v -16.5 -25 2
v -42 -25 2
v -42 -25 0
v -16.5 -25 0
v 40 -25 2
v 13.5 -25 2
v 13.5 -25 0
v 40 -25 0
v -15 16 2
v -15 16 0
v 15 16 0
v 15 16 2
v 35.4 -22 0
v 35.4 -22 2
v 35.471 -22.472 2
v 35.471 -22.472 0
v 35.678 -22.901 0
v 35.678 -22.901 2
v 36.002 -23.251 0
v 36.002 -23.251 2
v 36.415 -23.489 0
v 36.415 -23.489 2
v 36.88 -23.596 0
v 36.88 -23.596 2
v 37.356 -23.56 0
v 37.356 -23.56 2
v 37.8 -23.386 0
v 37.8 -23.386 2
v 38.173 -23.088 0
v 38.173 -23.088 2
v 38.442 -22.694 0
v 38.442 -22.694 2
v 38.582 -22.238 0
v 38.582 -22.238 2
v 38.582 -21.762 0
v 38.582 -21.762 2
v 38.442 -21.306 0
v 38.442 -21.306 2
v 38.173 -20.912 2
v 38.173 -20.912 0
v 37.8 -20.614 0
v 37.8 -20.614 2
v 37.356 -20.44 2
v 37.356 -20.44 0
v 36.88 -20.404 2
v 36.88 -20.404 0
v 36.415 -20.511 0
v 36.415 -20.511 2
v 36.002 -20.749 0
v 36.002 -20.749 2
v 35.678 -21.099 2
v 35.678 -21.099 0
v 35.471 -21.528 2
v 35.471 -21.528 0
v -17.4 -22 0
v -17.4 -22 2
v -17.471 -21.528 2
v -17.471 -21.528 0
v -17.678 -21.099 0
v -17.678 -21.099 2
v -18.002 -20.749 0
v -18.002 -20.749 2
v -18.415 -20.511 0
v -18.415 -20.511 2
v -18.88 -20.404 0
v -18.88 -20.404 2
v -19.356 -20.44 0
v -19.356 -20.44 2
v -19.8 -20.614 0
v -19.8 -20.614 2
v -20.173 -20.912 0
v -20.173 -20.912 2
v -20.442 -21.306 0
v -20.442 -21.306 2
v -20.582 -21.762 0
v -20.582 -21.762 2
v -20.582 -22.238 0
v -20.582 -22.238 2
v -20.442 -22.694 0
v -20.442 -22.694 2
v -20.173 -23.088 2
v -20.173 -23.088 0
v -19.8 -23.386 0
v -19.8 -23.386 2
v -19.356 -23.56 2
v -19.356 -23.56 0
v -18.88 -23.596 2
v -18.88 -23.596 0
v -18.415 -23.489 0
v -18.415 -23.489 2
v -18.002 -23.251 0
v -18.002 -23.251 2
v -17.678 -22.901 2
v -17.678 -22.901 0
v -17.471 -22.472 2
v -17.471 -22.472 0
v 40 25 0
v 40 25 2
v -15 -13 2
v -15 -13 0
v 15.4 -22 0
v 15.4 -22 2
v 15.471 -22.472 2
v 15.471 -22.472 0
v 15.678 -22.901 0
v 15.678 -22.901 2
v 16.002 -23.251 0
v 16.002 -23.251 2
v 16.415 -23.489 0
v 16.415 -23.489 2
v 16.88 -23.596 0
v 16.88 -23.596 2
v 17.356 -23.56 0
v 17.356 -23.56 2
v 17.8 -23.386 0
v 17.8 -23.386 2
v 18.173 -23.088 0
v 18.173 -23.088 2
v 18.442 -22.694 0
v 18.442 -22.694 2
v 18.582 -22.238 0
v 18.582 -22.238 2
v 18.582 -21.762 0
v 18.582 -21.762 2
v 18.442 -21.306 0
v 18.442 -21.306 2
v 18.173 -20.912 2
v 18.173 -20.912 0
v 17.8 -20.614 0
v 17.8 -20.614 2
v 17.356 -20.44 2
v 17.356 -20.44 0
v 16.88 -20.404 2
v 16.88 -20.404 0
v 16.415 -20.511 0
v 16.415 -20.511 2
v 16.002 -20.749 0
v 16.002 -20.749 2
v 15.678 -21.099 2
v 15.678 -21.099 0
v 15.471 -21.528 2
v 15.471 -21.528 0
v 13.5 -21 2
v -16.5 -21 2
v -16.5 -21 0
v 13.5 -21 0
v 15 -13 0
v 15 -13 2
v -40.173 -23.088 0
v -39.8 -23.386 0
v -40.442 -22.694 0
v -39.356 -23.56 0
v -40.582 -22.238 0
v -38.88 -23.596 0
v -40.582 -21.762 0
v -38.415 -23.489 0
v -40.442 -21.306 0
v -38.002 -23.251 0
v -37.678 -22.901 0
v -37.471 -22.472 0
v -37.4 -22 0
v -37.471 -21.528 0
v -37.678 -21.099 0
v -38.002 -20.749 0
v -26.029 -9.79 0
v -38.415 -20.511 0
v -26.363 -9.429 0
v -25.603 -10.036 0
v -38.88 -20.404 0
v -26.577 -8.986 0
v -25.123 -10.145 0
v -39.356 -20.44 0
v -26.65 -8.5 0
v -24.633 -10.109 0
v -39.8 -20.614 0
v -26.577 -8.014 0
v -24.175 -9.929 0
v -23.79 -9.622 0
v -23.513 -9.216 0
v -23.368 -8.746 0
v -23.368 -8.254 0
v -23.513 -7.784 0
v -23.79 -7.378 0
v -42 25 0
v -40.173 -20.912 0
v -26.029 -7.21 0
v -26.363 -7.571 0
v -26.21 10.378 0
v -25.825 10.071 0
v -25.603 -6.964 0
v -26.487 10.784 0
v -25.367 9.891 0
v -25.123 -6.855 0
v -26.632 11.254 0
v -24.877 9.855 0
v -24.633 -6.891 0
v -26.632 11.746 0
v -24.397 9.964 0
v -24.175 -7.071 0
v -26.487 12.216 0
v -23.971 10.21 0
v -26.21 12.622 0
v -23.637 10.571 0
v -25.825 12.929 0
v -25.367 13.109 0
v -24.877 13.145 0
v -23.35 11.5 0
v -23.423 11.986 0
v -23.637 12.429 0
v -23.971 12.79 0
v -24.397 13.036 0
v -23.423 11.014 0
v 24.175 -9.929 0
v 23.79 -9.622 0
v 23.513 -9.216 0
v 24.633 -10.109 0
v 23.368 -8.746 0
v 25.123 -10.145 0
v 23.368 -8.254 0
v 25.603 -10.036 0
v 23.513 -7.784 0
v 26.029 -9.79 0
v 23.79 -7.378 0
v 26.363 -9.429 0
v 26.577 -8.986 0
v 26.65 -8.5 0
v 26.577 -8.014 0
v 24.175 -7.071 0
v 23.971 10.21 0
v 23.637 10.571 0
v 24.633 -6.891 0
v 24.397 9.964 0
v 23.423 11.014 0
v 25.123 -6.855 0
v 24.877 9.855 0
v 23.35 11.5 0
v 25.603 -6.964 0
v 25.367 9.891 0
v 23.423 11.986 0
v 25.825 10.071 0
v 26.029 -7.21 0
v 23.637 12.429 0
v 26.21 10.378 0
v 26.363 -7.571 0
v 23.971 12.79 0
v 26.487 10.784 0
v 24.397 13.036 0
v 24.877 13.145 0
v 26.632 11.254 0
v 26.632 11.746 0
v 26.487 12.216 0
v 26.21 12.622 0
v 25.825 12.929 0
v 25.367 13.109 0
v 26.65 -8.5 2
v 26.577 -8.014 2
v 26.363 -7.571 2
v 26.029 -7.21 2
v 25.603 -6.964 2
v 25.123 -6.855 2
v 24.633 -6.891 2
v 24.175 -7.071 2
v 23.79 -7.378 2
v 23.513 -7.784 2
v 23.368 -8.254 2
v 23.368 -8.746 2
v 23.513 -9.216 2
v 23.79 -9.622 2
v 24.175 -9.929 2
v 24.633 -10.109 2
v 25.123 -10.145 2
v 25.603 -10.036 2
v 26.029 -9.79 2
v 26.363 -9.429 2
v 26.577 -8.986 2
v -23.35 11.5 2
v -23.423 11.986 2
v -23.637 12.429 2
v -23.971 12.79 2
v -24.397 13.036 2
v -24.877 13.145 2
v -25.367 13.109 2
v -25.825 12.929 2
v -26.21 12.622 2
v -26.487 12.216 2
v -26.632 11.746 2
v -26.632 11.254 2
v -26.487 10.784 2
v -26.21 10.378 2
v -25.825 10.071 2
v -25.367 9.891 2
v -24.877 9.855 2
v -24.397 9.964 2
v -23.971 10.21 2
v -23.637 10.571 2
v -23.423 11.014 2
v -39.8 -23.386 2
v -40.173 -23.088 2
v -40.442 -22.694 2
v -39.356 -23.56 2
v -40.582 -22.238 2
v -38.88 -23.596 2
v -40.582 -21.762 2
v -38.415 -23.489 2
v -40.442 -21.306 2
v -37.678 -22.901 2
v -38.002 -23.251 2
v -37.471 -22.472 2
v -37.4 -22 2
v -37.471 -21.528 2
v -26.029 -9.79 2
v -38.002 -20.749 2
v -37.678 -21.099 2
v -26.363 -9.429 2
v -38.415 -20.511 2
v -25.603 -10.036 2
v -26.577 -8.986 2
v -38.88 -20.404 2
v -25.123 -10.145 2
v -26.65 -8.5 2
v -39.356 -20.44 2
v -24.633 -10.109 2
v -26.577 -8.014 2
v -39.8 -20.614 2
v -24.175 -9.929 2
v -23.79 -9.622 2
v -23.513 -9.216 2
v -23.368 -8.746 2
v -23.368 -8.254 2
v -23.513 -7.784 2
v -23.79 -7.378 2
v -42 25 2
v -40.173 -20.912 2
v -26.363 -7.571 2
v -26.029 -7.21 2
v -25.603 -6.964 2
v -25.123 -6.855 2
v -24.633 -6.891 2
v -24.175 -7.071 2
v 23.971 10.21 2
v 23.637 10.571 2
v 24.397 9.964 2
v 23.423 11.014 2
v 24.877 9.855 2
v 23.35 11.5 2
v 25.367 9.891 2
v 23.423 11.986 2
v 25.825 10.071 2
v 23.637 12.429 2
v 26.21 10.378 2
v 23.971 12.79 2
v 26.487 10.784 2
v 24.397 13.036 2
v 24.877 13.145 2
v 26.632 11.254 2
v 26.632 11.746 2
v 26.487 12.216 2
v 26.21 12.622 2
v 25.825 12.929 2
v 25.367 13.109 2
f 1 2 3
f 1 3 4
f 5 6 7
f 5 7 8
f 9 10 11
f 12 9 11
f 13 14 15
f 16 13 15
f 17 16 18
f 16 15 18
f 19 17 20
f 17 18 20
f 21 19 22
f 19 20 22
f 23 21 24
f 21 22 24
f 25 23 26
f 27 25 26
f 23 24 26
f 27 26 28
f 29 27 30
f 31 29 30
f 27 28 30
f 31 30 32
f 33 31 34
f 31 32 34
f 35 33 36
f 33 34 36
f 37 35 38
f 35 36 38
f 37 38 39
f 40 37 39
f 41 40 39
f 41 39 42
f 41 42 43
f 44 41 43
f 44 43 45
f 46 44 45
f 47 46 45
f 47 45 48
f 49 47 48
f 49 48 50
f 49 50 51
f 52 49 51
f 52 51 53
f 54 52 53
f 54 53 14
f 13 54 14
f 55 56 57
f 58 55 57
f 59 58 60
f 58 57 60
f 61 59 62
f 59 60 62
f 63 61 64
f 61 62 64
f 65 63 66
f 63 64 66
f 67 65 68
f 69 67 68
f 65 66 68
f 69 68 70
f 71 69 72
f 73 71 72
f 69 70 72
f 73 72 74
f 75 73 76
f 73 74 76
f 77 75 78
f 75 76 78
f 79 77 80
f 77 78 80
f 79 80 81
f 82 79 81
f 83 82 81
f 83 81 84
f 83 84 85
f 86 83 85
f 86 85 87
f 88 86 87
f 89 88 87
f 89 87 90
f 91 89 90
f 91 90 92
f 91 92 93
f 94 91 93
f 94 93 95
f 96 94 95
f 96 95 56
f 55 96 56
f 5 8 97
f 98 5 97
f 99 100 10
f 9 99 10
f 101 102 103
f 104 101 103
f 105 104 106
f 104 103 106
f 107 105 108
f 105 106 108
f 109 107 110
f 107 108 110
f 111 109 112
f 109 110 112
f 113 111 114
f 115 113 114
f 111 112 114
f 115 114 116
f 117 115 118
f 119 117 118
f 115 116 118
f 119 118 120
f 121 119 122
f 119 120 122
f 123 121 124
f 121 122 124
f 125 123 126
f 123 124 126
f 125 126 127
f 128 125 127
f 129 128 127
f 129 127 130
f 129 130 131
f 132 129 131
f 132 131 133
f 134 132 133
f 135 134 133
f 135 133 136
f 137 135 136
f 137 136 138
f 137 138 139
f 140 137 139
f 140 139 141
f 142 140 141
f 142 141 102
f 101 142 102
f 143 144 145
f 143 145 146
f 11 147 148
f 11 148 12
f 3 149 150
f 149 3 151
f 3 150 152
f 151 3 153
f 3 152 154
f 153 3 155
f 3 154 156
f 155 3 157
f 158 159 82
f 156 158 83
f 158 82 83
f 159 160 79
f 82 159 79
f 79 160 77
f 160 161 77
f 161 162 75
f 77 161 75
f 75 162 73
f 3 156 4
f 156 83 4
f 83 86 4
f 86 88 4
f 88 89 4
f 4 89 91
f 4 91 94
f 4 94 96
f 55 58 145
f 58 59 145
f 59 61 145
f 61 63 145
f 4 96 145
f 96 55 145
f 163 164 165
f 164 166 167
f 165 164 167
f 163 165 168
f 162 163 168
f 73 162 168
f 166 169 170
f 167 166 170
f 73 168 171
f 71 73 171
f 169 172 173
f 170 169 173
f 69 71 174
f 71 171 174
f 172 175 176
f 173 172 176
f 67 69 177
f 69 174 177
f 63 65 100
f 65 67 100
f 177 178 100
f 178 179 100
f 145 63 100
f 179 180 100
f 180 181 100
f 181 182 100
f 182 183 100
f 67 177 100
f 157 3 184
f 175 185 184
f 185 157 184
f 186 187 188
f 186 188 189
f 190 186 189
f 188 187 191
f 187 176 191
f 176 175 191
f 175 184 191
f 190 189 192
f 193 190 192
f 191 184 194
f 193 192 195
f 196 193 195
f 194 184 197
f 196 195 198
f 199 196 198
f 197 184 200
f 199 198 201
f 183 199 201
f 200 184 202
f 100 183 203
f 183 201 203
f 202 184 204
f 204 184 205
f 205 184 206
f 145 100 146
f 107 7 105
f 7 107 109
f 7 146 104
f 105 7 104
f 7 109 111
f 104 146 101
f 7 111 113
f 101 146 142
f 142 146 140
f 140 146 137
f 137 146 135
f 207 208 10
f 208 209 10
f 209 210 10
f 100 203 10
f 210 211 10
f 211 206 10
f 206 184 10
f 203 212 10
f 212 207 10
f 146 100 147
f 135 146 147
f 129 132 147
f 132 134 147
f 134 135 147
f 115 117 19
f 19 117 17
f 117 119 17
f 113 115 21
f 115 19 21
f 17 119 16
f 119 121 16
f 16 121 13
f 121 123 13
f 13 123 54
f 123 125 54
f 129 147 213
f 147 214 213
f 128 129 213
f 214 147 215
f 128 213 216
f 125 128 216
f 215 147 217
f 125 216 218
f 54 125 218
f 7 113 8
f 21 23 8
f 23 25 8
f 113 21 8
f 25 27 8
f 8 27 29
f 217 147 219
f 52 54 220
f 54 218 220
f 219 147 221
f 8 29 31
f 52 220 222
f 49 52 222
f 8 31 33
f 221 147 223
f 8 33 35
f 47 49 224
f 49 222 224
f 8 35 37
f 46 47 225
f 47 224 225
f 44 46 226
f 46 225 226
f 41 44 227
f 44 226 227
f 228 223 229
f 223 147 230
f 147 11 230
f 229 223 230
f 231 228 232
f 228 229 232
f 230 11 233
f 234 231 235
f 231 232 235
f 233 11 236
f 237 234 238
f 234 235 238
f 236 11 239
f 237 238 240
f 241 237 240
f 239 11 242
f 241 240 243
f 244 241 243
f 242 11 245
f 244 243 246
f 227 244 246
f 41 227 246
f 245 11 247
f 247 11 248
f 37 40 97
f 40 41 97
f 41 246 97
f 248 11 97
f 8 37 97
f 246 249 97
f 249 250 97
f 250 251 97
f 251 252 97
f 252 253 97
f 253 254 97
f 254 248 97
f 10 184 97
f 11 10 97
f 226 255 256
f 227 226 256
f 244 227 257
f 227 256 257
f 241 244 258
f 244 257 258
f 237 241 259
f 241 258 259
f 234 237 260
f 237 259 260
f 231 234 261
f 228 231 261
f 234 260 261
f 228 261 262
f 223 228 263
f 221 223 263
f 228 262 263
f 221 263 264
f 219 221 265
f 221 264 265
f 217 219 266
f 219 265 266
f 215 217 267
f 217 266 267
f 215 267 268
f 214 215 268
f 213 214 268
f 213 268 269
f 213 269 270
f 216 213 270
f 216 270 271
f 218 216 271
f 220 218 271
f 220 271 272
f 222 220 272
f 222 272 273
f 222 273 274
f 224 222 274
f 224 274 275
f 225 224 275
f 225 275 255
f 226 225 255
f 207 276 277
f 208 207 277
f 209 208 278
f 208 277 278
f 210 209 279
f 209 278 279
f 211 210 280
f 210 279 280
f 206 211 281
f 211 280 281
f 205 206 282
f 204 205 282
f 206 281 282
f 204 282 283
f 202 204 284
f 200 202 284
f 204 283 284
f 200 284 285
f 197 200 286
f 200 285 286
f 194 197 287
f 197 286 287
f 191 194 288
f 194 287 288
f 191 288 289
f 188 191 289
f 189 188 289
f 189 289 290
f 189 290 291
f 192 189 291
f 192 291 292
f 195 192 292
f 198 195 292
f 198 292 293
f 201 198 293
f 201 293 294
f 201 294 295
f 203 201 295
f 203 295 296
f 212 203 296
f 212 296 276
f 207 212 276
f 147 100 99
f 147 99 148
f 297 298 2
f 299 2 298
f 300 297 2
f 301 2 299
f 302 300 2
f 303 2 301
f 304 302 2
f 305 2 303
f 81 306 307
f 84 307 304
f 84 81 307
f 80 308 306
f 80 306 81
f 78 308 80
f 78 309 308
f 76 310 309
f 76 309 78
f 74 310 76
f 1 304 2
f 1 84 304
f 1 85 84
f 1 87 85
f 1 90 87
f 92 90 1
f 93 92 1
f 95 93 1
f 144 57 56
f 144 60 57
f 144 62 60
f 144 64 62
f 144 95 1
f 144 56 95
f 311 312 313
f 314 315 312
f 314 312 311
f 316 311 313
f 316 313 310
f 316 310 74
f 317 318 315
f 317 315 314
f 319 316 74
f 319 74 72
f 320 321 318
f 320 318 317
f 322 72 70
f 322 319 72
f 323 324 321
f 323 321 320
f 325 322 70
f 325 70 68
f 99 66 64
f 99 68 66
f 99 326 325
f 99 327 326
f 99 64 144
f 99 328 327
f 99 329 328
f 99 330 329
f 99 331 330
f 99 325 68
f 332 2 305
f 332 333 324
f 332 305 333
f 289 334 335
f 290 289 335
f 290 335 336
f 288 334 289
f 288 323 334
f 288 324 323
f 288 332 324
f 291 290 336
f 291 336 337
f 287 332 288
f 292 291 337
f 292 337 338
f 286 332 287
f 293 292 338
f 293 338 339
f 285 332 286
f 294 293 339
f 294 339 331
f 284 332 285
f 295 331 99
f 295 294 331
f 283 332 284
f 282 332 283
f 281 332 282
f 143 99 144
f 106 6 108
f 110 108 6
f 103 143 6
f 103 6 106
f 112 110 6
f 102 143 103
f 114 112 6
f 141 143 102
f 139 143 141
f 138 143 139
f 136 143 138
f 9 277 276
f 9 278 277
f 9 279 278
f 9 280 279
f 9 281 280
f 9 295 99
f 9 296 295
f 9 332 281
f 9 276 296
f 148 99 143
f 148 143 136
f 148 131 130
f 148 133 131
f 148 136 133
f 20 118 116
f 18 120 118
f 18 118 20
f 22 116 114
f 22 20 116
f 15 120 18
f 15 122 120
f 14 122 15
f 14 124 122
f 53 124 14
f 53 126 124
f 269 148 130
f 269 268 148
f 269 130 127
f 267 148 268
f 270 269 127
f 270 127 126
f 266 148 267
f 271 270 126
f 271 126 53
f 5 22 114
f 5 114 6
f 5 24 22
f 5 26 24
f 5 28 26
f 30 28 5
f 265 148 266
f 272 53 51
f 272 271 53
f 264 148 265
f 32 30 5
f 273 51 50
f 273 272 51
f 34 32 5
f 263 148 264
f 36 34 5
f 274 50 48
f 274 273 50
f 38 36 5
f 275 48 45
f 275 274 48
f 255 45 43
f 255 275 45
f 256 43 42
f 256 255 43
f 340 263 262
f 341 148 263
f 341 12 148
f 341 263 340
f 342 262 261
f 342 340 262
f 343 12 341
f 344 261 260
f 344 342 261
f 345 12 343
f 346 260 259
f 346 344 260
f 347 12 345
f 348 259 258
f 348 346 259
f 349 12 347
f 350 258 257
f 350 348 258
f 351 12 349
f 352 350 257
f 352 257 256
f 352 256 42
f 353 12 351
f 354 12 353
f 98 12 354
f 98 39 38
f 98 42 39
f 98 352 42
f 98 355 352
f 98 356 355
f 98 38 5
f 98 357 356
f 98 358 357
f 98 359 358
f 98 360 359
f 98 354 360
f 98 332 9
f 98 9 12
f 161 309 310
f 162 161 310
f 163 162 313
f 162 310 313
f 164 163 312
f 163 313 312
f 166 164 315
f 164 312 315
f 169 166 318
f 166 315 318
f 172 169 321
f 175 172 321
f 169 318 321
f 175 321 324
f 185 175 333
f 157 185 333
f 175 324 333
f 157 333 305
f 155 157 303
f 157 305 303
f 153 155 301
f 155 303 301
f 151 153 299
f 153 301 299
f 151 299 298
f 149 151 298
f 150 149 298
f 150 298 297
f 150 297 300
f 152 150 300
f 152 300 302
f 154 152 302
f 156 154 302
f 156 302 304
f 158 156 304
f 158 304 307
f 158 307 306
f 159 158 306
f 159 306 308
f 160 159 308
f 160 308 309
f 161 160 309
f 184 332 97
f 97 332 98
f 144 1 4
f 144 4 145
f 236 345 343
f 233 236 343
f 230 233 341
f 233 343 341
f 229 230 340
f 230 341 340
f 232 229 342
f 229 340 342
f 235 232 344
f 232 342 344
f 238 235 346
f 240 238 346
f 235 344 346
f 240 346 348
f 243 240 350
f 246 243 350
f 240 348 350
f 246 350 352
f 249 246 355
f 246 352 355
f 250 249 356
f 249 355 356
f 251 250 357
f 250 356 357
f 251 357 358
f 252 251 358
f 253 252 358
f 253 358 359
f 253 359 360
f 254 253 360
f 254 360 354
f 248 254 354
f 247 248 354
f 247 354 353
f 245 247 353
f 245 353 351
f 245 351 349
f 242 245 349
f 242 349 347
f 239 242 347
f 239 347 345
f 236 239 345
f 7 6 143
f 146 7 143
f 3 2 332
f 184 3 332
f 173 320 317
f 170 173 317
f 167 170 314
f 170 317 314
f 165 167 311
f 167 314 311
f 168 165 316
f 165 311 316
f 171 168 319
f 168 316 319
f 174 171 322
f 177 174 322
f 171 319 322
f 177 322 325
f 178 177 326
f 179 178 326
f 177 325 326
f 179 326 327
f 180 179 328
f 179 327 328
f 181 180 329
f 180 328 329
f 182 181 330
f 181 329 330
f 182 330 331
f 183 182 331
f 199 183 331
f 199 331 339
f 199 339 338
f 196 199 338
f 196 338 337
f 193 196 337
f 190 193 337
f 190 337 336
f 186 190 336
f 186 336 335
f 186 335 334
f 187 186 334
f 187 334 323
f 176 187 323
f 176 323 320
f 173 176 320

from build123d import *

# Parameters (mm, degrees)
SKETCH_1_W          = 80
SKETCH_1_H          = 50
SKETCH_1_W_2        = 30
SKETCH_1_H_2        = 29
EXTRUDE_1_DEPTH     = 2
SKETCH_5_W          = 2
SKETCH_5_H          = 50
EXTRUDE_2_DEPTH     = 2
SKETCH_2_W          = 30
SKETCH_2_H          = 4
CUT_EXTRUDE_1_DEPTH = 49.918299235
SKETCH_3_R          = 1.6
CUT_EXTRUDE_2_DEPTH = 49.918299235
SKETCH_6_W          = 1.5
SKETCH_6_H          = 4
CUT_EXTRUDE_4_DEPTH = 49.918299235
SKETCH_7_W          = 1.5
SKETCH_7_H          = 4
EXTRUDE_3_DEPTH     = 2
SKETCH_8_R          = 1.65
CUT_EXTRUDE_5_DEPTH = 49.918299235


with BuildPart() as part:
    # 草图1 → 凸台-拉伸1 (new body)
    with BuildSketch(Plane.XY):
        Rectangle(SKETCH_1_W, SKETCH_1_H)
        with Locations((0, 1.5)):
            Rectangle(SKETCH_1_W_2, SKETCH_1_H_2, mode=Mode.SUBTRACT)
    extrude(amount=EXTRUDE_1_DEPTH)

    # 草图5 → 凸台-拉伸2 (add)
    with BuildSketch(Plane.XY.offset(2)):
        with Locations((-41, 0)):
            Rectangle(SKETCH_5_W, SKETCH_5_H)
    extrude(amount=-EXTRUDE_2_DEPTH)

    # 草图2 → 切除-拉伸1 (cut, through all)
    with BuildSketch(Plane.XY.offset(2)):
        with Locations((0, -23)):
            Rectangle(SKETCH_2_W, SKETCH_2_H)
    extrude(amount=-CUT_EXTRUDE_1_DEPTH, mode=Mode.SUBTRACT)

    # 草图3 → 切除-拉伸2 (cut, through all)
    with BuildSketch(Plane.XY.offset(2)):
        with Locations((-39, -22)):
            Circle(SKETCH_3_R)
        with Locations((-19, -22)):
            Circle(SKETCH_3_R)
        with Locations(Location((17, -22, 0), (0, 0, 180))):
            Circle(SKETCH_3_R)
        with Locations(Location((37, -22, 0), (0, 0, 180))):
            Circle(SKETCH_3_R)
    extrude(amount=-CUT_EXTRUDE_2_DEPTH, mode=Mode.SUBTRACT)

    # 草图6 → 切除-拉伸4 (cut, through all)
    with BuildSketch(Plane.XY.offset(2)):
        with Locations((-15.75, -23)):
            Rectangle(SKETCH_6_W, SKETCH_6_H)
    extrude(amount=-CUT_EXTRUDE_4_DEPTH, mode=Mode.SUBTRACT)

    # 草图7 → 凸台-拉伸3 (add)
    with BuildSketch(Plane.XY.offset(2)):
        with Locations((14.25, -23)):
            Rectangle(SKETCH_7_W, SKETCH_7_H)
    extrude(amount=-EXTRUDE_3_DEPTH)

    # 草图8 → 切除-拉伸5 (cut, through all)
    with BuildSketch(Plane.XY.offset(2)):
        with Locations((-25, 11.5)):
            Circle(SKETCH_8_R)
        with Locations(Location((25, 11.5, 0), (0, 0, 180))):
            Circle(SKETCH_8_R)
        with Locations(Location((-25, -8.5, 0), (0, 0, 180))):
            Circle(SKETCH_8_R)
        with Locations((25, -8.5)):
            Circle(SKETCH_8_R)
    extrude(amount=-CUT_EXTRUDE_5_DEPTH, mode=Mode.SUBTRACT)


solid = part.part
